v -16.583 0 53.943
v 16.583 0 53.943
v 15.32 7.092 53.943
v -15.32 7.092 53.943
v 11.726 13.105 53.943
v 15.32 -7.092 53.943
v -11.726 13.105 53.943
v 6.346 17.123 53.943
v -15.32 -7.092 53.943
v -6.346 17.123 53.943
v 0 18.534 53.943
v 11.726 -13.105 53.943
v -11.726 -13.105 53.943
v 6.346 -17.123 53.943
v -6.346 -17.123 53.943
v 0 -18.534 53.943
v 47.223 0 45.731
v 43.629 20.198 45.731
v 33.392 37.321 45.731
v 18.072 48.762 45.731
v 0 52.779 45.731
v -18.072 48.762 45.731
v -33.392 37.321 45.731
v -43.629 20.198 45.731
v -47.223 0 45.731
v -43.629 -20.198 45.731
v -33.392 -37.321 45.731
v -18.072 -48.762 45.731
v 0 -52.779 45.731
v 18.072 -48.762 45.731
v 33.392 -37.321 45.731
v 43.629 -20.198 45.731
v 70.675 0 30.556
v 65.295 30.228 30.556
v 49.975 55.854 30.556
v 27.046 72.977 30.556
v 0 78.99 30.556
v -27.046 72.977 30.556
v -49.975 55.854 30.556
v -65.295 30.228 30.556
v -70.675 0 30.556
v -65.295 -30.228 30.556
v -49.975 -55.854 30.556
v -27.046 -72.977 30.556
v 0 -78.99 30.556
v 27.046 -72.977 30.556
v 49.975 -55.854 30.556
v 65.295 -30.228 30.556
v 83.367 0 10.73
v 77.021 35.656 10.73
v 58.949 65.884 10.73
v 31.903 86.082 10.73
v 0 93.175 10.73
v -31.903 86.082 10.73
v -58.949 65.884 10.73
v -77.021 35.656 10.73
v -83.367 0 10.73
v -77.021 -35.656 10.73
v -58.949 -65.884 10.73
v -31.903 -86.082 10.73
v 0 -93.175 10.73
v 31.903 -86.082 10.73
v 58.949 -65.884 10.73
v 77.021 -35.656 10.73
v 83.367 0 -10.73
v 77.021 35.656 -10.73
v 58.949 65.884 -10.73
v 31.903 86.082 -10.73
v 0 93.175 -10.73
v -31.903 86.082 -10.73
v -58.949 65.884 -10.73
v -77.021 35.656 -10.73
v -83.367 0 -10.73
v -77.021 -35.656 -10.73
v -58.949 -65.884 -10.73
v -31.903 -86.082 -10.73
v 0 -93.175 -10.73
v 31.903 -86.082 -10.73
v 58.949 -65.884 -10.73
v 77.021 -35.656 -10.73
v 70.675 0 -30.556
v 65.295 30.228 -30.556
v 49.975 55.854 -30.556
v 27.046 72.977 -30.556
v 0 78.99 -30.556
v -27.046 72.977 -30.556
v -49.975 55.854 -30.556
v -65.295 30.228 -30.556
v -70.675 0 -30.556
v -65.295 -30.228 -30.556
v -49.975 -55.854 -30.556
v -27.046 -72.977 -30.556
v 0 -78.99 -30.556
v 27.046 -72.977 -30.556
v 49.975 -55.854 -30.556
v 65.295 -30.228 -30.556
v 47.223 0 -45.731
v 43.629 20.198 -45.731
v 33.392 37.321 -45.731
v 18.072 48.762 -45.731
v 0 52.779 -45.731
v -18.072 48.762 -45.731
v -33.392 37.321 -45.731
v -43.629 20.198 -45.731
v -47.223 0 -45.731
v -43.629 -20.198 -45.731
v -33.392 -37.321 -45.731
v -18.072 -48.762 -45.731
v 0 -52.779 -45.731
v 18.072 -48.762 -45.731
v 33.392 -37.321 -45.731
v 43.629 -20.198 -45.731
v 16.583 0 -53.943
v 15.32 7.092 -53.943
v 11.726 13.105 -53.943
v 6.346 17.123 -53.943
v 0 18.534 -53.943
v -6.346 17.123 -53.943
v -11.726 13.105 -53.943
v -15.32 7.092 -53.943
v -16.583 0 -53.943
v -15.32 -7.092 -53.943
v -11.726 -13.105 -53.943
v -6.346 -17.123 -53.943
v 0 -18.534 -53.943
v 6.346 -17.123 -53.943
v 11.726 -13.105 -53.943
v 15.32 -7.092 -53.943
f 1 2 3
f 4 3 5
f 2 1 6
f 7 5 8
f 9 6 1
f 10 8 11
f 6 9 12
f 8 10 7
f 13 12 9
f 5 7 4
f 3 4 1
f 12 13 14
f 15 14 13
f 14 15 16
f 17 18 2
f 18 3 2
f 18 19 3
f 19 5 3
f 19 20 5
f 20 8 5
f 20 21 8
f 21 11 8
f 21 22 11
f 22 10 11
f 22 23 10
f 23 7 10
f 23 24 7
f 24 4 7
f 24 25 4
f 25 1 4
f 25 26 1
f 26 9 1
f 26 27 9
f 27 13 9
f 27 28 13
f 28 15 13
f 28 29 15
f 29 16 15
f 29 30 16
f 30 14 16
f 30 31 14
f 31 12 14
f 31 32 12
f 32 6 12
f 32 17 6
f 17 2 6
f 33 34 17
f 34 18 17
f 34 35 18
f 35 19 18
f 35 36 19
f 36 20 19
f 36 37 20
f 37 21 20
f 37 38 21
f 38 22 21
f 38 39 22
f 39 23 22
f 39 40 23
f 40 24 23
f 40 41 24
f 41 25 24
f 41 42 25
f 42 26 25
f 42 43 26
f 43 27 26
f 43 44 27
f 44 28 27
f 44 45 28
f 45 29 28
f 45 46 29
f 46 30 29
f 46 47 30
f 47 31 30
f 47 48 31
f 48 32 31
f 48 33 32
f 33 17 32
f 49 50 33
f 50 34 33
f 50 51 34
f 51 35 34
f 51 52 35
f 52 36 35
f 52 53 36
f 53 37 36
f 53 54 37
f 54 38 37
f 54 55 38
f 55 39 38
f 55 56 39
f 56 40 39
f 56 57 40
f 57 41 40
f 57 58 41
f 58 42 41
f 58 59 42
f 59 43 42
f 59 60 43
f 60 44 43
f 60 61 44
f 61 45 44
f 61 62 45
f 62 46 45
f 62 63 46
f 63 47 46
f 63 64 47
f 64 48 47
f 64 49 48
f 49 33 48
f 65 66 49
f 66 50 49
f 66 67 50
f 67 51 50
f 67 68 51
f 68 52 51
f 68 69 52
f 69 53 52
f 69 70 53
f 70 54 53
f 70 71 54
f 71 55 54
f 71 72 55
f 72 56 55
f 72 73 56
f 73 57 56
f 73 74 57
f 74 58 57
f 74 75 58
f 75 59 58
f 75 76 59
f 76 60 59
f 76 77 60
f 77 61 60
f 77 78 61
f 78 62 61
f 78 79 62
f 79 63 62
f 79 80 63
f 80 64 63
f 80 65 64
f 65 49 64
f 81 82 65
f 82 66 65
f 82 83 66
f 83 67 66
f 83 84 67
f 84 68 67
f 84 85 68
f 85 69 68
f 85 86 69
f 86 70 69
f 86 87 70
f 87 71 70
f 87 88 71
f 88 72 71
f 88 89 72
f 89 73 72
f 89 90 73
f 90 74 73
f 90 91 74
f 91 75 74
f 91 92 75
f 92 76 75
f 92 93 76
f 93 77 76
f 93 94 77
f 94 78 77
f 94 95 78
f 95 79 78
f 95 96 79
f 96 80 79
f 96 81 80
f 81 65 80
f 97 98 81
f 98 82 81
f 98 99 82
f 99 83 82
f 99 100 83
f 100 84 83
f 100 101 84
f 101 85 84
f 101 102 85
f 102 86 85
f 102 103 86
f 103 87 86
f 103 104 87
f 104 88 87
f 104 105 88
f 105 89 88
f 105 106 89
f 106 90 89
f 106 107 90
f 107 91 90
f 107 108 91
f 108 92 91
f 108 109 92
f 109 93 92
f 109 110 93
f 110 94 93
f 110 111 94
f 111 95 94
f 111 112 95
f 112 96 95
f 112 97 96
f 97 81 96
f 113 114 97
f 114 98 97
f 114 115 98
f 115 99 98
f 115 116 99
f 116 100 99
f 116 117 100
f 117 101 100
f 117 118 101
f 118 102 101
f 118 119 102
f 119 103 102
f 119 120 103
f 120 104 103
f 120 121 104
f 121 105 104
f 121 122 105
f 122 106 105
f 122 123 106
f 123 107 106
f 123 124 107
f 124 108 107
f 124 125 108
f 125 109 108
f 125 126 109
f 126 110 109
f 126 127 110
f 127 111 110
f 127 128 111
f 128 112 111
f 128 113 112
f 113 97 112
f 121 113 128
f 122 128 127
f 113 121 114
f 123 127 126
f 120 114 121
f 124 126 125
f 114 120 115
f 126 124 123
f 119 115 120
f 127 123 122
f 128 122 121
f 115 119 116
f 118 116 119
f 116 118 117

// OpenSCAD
// Generated by SolidPython 1.0.1 on 2020-07-29 00:46:53


scale(v = [17, 19, 11]) {
	sphere(r = 5);
}
/***********************************************
*********      SolidPython code:      **********
************************************************
 
# import packages: SolidPython
from solid import *
from solid.utils import *
from itertools import chain, combinations, permutations


class Resize:

    def __init__(self, scad_file):
        self.scad_file = scad_file
        #self.scad_file = import_scad(scad_file)
        # cone/cylinder param:
        self.r1 = 0
        self.r2 = 0
        self.h = 0
        # rectangular prism param:
        self.w = 0
        self.l = 0
        # ellipse param:
        self.r = 0

    # import OpenScad code (file name corresponds to shape)


    # classify shape + parameters
    def assign(self, param1, param2, param3):
        if self.scad_file == 'cone.scad':
            self.r1 = param1
            self.r2 = param2
            self.h = param3
        elif self.scad_file == 'cylinder.scad':
            self.r1 = param1
            self.r2 = param2
            self.h = param3
        elif self.scad_file == 'rectangularPrism.scad':
            self.h = param1
            self.l = param2
            self.w = param3
        else:
            self.r = param1
            self.h = param2

    # resize parameters
    def iterate(self):
        x = range(3, 20, 2)
        i = 1
        if self.scad_file == 'cone.scad':
            tempList = list(permutations(x, 2))
            for temp in tempList:
                param1 = temp[0]
                param2 = temp[1]
                filepath = 'produced_scad_files/' + 'cone' + str(param1) + '_' + str(param2) + '_' + '.scad'
                scad_render_to_file(cylinder(h=param1, r1=param2, r2=0), filepath)

        elif self.scad_file == 'cylinder.scad':
            tempList = list(permutations(x, 3))
            for temp in tempList:
                param1 = temp[0]
                param2 = temp[1]
                filepath = 'produced_scad_files/' + 'cylinder' + str(param1) + '_' + str(param2) + '_' + '.scad'
                scad_render_to_file(cylinder(h=param1, r1=param2, r2=param2), filepath)

        elif self.scad_file == 'rectangularPrism.scad':
            tempList = list(permutations(x, 3))
            for temp in tempList:
                param1 = temp[0]
                param2 = temp[1]
                param3 = temp[2]
                filepath = 'produced_scad_files/' + 'rectangularPrism' + str(param1) + '_' + str(param2) + '_' + str(
                    param3) + '.scad'
                scad_render_to_file(cube(size=(param1, param2, param3)), filepath)

        elif self.scad_file == 'ellipse.scad':
            tempList = list(permutations(x, 4))
            for temp in tempList:
                param1 = temp[0]
                param2 = temp[1]
                param3 = temp[2]
                param4 = temp[3]
                filepath = 'produced_scad_files/' + 'ellipse' + str(param1) + '_' + str(param2) + '_' + str(param3) + '_' + str(param4) + '.scad'
                scad_render_to_file(scale([param1, param2, param3])(sphere(r=param4)), filepath)

    def render_to_scadfile(self):
        scad_render_to_file(scad, 'example.scad') 
 
************************************************/
